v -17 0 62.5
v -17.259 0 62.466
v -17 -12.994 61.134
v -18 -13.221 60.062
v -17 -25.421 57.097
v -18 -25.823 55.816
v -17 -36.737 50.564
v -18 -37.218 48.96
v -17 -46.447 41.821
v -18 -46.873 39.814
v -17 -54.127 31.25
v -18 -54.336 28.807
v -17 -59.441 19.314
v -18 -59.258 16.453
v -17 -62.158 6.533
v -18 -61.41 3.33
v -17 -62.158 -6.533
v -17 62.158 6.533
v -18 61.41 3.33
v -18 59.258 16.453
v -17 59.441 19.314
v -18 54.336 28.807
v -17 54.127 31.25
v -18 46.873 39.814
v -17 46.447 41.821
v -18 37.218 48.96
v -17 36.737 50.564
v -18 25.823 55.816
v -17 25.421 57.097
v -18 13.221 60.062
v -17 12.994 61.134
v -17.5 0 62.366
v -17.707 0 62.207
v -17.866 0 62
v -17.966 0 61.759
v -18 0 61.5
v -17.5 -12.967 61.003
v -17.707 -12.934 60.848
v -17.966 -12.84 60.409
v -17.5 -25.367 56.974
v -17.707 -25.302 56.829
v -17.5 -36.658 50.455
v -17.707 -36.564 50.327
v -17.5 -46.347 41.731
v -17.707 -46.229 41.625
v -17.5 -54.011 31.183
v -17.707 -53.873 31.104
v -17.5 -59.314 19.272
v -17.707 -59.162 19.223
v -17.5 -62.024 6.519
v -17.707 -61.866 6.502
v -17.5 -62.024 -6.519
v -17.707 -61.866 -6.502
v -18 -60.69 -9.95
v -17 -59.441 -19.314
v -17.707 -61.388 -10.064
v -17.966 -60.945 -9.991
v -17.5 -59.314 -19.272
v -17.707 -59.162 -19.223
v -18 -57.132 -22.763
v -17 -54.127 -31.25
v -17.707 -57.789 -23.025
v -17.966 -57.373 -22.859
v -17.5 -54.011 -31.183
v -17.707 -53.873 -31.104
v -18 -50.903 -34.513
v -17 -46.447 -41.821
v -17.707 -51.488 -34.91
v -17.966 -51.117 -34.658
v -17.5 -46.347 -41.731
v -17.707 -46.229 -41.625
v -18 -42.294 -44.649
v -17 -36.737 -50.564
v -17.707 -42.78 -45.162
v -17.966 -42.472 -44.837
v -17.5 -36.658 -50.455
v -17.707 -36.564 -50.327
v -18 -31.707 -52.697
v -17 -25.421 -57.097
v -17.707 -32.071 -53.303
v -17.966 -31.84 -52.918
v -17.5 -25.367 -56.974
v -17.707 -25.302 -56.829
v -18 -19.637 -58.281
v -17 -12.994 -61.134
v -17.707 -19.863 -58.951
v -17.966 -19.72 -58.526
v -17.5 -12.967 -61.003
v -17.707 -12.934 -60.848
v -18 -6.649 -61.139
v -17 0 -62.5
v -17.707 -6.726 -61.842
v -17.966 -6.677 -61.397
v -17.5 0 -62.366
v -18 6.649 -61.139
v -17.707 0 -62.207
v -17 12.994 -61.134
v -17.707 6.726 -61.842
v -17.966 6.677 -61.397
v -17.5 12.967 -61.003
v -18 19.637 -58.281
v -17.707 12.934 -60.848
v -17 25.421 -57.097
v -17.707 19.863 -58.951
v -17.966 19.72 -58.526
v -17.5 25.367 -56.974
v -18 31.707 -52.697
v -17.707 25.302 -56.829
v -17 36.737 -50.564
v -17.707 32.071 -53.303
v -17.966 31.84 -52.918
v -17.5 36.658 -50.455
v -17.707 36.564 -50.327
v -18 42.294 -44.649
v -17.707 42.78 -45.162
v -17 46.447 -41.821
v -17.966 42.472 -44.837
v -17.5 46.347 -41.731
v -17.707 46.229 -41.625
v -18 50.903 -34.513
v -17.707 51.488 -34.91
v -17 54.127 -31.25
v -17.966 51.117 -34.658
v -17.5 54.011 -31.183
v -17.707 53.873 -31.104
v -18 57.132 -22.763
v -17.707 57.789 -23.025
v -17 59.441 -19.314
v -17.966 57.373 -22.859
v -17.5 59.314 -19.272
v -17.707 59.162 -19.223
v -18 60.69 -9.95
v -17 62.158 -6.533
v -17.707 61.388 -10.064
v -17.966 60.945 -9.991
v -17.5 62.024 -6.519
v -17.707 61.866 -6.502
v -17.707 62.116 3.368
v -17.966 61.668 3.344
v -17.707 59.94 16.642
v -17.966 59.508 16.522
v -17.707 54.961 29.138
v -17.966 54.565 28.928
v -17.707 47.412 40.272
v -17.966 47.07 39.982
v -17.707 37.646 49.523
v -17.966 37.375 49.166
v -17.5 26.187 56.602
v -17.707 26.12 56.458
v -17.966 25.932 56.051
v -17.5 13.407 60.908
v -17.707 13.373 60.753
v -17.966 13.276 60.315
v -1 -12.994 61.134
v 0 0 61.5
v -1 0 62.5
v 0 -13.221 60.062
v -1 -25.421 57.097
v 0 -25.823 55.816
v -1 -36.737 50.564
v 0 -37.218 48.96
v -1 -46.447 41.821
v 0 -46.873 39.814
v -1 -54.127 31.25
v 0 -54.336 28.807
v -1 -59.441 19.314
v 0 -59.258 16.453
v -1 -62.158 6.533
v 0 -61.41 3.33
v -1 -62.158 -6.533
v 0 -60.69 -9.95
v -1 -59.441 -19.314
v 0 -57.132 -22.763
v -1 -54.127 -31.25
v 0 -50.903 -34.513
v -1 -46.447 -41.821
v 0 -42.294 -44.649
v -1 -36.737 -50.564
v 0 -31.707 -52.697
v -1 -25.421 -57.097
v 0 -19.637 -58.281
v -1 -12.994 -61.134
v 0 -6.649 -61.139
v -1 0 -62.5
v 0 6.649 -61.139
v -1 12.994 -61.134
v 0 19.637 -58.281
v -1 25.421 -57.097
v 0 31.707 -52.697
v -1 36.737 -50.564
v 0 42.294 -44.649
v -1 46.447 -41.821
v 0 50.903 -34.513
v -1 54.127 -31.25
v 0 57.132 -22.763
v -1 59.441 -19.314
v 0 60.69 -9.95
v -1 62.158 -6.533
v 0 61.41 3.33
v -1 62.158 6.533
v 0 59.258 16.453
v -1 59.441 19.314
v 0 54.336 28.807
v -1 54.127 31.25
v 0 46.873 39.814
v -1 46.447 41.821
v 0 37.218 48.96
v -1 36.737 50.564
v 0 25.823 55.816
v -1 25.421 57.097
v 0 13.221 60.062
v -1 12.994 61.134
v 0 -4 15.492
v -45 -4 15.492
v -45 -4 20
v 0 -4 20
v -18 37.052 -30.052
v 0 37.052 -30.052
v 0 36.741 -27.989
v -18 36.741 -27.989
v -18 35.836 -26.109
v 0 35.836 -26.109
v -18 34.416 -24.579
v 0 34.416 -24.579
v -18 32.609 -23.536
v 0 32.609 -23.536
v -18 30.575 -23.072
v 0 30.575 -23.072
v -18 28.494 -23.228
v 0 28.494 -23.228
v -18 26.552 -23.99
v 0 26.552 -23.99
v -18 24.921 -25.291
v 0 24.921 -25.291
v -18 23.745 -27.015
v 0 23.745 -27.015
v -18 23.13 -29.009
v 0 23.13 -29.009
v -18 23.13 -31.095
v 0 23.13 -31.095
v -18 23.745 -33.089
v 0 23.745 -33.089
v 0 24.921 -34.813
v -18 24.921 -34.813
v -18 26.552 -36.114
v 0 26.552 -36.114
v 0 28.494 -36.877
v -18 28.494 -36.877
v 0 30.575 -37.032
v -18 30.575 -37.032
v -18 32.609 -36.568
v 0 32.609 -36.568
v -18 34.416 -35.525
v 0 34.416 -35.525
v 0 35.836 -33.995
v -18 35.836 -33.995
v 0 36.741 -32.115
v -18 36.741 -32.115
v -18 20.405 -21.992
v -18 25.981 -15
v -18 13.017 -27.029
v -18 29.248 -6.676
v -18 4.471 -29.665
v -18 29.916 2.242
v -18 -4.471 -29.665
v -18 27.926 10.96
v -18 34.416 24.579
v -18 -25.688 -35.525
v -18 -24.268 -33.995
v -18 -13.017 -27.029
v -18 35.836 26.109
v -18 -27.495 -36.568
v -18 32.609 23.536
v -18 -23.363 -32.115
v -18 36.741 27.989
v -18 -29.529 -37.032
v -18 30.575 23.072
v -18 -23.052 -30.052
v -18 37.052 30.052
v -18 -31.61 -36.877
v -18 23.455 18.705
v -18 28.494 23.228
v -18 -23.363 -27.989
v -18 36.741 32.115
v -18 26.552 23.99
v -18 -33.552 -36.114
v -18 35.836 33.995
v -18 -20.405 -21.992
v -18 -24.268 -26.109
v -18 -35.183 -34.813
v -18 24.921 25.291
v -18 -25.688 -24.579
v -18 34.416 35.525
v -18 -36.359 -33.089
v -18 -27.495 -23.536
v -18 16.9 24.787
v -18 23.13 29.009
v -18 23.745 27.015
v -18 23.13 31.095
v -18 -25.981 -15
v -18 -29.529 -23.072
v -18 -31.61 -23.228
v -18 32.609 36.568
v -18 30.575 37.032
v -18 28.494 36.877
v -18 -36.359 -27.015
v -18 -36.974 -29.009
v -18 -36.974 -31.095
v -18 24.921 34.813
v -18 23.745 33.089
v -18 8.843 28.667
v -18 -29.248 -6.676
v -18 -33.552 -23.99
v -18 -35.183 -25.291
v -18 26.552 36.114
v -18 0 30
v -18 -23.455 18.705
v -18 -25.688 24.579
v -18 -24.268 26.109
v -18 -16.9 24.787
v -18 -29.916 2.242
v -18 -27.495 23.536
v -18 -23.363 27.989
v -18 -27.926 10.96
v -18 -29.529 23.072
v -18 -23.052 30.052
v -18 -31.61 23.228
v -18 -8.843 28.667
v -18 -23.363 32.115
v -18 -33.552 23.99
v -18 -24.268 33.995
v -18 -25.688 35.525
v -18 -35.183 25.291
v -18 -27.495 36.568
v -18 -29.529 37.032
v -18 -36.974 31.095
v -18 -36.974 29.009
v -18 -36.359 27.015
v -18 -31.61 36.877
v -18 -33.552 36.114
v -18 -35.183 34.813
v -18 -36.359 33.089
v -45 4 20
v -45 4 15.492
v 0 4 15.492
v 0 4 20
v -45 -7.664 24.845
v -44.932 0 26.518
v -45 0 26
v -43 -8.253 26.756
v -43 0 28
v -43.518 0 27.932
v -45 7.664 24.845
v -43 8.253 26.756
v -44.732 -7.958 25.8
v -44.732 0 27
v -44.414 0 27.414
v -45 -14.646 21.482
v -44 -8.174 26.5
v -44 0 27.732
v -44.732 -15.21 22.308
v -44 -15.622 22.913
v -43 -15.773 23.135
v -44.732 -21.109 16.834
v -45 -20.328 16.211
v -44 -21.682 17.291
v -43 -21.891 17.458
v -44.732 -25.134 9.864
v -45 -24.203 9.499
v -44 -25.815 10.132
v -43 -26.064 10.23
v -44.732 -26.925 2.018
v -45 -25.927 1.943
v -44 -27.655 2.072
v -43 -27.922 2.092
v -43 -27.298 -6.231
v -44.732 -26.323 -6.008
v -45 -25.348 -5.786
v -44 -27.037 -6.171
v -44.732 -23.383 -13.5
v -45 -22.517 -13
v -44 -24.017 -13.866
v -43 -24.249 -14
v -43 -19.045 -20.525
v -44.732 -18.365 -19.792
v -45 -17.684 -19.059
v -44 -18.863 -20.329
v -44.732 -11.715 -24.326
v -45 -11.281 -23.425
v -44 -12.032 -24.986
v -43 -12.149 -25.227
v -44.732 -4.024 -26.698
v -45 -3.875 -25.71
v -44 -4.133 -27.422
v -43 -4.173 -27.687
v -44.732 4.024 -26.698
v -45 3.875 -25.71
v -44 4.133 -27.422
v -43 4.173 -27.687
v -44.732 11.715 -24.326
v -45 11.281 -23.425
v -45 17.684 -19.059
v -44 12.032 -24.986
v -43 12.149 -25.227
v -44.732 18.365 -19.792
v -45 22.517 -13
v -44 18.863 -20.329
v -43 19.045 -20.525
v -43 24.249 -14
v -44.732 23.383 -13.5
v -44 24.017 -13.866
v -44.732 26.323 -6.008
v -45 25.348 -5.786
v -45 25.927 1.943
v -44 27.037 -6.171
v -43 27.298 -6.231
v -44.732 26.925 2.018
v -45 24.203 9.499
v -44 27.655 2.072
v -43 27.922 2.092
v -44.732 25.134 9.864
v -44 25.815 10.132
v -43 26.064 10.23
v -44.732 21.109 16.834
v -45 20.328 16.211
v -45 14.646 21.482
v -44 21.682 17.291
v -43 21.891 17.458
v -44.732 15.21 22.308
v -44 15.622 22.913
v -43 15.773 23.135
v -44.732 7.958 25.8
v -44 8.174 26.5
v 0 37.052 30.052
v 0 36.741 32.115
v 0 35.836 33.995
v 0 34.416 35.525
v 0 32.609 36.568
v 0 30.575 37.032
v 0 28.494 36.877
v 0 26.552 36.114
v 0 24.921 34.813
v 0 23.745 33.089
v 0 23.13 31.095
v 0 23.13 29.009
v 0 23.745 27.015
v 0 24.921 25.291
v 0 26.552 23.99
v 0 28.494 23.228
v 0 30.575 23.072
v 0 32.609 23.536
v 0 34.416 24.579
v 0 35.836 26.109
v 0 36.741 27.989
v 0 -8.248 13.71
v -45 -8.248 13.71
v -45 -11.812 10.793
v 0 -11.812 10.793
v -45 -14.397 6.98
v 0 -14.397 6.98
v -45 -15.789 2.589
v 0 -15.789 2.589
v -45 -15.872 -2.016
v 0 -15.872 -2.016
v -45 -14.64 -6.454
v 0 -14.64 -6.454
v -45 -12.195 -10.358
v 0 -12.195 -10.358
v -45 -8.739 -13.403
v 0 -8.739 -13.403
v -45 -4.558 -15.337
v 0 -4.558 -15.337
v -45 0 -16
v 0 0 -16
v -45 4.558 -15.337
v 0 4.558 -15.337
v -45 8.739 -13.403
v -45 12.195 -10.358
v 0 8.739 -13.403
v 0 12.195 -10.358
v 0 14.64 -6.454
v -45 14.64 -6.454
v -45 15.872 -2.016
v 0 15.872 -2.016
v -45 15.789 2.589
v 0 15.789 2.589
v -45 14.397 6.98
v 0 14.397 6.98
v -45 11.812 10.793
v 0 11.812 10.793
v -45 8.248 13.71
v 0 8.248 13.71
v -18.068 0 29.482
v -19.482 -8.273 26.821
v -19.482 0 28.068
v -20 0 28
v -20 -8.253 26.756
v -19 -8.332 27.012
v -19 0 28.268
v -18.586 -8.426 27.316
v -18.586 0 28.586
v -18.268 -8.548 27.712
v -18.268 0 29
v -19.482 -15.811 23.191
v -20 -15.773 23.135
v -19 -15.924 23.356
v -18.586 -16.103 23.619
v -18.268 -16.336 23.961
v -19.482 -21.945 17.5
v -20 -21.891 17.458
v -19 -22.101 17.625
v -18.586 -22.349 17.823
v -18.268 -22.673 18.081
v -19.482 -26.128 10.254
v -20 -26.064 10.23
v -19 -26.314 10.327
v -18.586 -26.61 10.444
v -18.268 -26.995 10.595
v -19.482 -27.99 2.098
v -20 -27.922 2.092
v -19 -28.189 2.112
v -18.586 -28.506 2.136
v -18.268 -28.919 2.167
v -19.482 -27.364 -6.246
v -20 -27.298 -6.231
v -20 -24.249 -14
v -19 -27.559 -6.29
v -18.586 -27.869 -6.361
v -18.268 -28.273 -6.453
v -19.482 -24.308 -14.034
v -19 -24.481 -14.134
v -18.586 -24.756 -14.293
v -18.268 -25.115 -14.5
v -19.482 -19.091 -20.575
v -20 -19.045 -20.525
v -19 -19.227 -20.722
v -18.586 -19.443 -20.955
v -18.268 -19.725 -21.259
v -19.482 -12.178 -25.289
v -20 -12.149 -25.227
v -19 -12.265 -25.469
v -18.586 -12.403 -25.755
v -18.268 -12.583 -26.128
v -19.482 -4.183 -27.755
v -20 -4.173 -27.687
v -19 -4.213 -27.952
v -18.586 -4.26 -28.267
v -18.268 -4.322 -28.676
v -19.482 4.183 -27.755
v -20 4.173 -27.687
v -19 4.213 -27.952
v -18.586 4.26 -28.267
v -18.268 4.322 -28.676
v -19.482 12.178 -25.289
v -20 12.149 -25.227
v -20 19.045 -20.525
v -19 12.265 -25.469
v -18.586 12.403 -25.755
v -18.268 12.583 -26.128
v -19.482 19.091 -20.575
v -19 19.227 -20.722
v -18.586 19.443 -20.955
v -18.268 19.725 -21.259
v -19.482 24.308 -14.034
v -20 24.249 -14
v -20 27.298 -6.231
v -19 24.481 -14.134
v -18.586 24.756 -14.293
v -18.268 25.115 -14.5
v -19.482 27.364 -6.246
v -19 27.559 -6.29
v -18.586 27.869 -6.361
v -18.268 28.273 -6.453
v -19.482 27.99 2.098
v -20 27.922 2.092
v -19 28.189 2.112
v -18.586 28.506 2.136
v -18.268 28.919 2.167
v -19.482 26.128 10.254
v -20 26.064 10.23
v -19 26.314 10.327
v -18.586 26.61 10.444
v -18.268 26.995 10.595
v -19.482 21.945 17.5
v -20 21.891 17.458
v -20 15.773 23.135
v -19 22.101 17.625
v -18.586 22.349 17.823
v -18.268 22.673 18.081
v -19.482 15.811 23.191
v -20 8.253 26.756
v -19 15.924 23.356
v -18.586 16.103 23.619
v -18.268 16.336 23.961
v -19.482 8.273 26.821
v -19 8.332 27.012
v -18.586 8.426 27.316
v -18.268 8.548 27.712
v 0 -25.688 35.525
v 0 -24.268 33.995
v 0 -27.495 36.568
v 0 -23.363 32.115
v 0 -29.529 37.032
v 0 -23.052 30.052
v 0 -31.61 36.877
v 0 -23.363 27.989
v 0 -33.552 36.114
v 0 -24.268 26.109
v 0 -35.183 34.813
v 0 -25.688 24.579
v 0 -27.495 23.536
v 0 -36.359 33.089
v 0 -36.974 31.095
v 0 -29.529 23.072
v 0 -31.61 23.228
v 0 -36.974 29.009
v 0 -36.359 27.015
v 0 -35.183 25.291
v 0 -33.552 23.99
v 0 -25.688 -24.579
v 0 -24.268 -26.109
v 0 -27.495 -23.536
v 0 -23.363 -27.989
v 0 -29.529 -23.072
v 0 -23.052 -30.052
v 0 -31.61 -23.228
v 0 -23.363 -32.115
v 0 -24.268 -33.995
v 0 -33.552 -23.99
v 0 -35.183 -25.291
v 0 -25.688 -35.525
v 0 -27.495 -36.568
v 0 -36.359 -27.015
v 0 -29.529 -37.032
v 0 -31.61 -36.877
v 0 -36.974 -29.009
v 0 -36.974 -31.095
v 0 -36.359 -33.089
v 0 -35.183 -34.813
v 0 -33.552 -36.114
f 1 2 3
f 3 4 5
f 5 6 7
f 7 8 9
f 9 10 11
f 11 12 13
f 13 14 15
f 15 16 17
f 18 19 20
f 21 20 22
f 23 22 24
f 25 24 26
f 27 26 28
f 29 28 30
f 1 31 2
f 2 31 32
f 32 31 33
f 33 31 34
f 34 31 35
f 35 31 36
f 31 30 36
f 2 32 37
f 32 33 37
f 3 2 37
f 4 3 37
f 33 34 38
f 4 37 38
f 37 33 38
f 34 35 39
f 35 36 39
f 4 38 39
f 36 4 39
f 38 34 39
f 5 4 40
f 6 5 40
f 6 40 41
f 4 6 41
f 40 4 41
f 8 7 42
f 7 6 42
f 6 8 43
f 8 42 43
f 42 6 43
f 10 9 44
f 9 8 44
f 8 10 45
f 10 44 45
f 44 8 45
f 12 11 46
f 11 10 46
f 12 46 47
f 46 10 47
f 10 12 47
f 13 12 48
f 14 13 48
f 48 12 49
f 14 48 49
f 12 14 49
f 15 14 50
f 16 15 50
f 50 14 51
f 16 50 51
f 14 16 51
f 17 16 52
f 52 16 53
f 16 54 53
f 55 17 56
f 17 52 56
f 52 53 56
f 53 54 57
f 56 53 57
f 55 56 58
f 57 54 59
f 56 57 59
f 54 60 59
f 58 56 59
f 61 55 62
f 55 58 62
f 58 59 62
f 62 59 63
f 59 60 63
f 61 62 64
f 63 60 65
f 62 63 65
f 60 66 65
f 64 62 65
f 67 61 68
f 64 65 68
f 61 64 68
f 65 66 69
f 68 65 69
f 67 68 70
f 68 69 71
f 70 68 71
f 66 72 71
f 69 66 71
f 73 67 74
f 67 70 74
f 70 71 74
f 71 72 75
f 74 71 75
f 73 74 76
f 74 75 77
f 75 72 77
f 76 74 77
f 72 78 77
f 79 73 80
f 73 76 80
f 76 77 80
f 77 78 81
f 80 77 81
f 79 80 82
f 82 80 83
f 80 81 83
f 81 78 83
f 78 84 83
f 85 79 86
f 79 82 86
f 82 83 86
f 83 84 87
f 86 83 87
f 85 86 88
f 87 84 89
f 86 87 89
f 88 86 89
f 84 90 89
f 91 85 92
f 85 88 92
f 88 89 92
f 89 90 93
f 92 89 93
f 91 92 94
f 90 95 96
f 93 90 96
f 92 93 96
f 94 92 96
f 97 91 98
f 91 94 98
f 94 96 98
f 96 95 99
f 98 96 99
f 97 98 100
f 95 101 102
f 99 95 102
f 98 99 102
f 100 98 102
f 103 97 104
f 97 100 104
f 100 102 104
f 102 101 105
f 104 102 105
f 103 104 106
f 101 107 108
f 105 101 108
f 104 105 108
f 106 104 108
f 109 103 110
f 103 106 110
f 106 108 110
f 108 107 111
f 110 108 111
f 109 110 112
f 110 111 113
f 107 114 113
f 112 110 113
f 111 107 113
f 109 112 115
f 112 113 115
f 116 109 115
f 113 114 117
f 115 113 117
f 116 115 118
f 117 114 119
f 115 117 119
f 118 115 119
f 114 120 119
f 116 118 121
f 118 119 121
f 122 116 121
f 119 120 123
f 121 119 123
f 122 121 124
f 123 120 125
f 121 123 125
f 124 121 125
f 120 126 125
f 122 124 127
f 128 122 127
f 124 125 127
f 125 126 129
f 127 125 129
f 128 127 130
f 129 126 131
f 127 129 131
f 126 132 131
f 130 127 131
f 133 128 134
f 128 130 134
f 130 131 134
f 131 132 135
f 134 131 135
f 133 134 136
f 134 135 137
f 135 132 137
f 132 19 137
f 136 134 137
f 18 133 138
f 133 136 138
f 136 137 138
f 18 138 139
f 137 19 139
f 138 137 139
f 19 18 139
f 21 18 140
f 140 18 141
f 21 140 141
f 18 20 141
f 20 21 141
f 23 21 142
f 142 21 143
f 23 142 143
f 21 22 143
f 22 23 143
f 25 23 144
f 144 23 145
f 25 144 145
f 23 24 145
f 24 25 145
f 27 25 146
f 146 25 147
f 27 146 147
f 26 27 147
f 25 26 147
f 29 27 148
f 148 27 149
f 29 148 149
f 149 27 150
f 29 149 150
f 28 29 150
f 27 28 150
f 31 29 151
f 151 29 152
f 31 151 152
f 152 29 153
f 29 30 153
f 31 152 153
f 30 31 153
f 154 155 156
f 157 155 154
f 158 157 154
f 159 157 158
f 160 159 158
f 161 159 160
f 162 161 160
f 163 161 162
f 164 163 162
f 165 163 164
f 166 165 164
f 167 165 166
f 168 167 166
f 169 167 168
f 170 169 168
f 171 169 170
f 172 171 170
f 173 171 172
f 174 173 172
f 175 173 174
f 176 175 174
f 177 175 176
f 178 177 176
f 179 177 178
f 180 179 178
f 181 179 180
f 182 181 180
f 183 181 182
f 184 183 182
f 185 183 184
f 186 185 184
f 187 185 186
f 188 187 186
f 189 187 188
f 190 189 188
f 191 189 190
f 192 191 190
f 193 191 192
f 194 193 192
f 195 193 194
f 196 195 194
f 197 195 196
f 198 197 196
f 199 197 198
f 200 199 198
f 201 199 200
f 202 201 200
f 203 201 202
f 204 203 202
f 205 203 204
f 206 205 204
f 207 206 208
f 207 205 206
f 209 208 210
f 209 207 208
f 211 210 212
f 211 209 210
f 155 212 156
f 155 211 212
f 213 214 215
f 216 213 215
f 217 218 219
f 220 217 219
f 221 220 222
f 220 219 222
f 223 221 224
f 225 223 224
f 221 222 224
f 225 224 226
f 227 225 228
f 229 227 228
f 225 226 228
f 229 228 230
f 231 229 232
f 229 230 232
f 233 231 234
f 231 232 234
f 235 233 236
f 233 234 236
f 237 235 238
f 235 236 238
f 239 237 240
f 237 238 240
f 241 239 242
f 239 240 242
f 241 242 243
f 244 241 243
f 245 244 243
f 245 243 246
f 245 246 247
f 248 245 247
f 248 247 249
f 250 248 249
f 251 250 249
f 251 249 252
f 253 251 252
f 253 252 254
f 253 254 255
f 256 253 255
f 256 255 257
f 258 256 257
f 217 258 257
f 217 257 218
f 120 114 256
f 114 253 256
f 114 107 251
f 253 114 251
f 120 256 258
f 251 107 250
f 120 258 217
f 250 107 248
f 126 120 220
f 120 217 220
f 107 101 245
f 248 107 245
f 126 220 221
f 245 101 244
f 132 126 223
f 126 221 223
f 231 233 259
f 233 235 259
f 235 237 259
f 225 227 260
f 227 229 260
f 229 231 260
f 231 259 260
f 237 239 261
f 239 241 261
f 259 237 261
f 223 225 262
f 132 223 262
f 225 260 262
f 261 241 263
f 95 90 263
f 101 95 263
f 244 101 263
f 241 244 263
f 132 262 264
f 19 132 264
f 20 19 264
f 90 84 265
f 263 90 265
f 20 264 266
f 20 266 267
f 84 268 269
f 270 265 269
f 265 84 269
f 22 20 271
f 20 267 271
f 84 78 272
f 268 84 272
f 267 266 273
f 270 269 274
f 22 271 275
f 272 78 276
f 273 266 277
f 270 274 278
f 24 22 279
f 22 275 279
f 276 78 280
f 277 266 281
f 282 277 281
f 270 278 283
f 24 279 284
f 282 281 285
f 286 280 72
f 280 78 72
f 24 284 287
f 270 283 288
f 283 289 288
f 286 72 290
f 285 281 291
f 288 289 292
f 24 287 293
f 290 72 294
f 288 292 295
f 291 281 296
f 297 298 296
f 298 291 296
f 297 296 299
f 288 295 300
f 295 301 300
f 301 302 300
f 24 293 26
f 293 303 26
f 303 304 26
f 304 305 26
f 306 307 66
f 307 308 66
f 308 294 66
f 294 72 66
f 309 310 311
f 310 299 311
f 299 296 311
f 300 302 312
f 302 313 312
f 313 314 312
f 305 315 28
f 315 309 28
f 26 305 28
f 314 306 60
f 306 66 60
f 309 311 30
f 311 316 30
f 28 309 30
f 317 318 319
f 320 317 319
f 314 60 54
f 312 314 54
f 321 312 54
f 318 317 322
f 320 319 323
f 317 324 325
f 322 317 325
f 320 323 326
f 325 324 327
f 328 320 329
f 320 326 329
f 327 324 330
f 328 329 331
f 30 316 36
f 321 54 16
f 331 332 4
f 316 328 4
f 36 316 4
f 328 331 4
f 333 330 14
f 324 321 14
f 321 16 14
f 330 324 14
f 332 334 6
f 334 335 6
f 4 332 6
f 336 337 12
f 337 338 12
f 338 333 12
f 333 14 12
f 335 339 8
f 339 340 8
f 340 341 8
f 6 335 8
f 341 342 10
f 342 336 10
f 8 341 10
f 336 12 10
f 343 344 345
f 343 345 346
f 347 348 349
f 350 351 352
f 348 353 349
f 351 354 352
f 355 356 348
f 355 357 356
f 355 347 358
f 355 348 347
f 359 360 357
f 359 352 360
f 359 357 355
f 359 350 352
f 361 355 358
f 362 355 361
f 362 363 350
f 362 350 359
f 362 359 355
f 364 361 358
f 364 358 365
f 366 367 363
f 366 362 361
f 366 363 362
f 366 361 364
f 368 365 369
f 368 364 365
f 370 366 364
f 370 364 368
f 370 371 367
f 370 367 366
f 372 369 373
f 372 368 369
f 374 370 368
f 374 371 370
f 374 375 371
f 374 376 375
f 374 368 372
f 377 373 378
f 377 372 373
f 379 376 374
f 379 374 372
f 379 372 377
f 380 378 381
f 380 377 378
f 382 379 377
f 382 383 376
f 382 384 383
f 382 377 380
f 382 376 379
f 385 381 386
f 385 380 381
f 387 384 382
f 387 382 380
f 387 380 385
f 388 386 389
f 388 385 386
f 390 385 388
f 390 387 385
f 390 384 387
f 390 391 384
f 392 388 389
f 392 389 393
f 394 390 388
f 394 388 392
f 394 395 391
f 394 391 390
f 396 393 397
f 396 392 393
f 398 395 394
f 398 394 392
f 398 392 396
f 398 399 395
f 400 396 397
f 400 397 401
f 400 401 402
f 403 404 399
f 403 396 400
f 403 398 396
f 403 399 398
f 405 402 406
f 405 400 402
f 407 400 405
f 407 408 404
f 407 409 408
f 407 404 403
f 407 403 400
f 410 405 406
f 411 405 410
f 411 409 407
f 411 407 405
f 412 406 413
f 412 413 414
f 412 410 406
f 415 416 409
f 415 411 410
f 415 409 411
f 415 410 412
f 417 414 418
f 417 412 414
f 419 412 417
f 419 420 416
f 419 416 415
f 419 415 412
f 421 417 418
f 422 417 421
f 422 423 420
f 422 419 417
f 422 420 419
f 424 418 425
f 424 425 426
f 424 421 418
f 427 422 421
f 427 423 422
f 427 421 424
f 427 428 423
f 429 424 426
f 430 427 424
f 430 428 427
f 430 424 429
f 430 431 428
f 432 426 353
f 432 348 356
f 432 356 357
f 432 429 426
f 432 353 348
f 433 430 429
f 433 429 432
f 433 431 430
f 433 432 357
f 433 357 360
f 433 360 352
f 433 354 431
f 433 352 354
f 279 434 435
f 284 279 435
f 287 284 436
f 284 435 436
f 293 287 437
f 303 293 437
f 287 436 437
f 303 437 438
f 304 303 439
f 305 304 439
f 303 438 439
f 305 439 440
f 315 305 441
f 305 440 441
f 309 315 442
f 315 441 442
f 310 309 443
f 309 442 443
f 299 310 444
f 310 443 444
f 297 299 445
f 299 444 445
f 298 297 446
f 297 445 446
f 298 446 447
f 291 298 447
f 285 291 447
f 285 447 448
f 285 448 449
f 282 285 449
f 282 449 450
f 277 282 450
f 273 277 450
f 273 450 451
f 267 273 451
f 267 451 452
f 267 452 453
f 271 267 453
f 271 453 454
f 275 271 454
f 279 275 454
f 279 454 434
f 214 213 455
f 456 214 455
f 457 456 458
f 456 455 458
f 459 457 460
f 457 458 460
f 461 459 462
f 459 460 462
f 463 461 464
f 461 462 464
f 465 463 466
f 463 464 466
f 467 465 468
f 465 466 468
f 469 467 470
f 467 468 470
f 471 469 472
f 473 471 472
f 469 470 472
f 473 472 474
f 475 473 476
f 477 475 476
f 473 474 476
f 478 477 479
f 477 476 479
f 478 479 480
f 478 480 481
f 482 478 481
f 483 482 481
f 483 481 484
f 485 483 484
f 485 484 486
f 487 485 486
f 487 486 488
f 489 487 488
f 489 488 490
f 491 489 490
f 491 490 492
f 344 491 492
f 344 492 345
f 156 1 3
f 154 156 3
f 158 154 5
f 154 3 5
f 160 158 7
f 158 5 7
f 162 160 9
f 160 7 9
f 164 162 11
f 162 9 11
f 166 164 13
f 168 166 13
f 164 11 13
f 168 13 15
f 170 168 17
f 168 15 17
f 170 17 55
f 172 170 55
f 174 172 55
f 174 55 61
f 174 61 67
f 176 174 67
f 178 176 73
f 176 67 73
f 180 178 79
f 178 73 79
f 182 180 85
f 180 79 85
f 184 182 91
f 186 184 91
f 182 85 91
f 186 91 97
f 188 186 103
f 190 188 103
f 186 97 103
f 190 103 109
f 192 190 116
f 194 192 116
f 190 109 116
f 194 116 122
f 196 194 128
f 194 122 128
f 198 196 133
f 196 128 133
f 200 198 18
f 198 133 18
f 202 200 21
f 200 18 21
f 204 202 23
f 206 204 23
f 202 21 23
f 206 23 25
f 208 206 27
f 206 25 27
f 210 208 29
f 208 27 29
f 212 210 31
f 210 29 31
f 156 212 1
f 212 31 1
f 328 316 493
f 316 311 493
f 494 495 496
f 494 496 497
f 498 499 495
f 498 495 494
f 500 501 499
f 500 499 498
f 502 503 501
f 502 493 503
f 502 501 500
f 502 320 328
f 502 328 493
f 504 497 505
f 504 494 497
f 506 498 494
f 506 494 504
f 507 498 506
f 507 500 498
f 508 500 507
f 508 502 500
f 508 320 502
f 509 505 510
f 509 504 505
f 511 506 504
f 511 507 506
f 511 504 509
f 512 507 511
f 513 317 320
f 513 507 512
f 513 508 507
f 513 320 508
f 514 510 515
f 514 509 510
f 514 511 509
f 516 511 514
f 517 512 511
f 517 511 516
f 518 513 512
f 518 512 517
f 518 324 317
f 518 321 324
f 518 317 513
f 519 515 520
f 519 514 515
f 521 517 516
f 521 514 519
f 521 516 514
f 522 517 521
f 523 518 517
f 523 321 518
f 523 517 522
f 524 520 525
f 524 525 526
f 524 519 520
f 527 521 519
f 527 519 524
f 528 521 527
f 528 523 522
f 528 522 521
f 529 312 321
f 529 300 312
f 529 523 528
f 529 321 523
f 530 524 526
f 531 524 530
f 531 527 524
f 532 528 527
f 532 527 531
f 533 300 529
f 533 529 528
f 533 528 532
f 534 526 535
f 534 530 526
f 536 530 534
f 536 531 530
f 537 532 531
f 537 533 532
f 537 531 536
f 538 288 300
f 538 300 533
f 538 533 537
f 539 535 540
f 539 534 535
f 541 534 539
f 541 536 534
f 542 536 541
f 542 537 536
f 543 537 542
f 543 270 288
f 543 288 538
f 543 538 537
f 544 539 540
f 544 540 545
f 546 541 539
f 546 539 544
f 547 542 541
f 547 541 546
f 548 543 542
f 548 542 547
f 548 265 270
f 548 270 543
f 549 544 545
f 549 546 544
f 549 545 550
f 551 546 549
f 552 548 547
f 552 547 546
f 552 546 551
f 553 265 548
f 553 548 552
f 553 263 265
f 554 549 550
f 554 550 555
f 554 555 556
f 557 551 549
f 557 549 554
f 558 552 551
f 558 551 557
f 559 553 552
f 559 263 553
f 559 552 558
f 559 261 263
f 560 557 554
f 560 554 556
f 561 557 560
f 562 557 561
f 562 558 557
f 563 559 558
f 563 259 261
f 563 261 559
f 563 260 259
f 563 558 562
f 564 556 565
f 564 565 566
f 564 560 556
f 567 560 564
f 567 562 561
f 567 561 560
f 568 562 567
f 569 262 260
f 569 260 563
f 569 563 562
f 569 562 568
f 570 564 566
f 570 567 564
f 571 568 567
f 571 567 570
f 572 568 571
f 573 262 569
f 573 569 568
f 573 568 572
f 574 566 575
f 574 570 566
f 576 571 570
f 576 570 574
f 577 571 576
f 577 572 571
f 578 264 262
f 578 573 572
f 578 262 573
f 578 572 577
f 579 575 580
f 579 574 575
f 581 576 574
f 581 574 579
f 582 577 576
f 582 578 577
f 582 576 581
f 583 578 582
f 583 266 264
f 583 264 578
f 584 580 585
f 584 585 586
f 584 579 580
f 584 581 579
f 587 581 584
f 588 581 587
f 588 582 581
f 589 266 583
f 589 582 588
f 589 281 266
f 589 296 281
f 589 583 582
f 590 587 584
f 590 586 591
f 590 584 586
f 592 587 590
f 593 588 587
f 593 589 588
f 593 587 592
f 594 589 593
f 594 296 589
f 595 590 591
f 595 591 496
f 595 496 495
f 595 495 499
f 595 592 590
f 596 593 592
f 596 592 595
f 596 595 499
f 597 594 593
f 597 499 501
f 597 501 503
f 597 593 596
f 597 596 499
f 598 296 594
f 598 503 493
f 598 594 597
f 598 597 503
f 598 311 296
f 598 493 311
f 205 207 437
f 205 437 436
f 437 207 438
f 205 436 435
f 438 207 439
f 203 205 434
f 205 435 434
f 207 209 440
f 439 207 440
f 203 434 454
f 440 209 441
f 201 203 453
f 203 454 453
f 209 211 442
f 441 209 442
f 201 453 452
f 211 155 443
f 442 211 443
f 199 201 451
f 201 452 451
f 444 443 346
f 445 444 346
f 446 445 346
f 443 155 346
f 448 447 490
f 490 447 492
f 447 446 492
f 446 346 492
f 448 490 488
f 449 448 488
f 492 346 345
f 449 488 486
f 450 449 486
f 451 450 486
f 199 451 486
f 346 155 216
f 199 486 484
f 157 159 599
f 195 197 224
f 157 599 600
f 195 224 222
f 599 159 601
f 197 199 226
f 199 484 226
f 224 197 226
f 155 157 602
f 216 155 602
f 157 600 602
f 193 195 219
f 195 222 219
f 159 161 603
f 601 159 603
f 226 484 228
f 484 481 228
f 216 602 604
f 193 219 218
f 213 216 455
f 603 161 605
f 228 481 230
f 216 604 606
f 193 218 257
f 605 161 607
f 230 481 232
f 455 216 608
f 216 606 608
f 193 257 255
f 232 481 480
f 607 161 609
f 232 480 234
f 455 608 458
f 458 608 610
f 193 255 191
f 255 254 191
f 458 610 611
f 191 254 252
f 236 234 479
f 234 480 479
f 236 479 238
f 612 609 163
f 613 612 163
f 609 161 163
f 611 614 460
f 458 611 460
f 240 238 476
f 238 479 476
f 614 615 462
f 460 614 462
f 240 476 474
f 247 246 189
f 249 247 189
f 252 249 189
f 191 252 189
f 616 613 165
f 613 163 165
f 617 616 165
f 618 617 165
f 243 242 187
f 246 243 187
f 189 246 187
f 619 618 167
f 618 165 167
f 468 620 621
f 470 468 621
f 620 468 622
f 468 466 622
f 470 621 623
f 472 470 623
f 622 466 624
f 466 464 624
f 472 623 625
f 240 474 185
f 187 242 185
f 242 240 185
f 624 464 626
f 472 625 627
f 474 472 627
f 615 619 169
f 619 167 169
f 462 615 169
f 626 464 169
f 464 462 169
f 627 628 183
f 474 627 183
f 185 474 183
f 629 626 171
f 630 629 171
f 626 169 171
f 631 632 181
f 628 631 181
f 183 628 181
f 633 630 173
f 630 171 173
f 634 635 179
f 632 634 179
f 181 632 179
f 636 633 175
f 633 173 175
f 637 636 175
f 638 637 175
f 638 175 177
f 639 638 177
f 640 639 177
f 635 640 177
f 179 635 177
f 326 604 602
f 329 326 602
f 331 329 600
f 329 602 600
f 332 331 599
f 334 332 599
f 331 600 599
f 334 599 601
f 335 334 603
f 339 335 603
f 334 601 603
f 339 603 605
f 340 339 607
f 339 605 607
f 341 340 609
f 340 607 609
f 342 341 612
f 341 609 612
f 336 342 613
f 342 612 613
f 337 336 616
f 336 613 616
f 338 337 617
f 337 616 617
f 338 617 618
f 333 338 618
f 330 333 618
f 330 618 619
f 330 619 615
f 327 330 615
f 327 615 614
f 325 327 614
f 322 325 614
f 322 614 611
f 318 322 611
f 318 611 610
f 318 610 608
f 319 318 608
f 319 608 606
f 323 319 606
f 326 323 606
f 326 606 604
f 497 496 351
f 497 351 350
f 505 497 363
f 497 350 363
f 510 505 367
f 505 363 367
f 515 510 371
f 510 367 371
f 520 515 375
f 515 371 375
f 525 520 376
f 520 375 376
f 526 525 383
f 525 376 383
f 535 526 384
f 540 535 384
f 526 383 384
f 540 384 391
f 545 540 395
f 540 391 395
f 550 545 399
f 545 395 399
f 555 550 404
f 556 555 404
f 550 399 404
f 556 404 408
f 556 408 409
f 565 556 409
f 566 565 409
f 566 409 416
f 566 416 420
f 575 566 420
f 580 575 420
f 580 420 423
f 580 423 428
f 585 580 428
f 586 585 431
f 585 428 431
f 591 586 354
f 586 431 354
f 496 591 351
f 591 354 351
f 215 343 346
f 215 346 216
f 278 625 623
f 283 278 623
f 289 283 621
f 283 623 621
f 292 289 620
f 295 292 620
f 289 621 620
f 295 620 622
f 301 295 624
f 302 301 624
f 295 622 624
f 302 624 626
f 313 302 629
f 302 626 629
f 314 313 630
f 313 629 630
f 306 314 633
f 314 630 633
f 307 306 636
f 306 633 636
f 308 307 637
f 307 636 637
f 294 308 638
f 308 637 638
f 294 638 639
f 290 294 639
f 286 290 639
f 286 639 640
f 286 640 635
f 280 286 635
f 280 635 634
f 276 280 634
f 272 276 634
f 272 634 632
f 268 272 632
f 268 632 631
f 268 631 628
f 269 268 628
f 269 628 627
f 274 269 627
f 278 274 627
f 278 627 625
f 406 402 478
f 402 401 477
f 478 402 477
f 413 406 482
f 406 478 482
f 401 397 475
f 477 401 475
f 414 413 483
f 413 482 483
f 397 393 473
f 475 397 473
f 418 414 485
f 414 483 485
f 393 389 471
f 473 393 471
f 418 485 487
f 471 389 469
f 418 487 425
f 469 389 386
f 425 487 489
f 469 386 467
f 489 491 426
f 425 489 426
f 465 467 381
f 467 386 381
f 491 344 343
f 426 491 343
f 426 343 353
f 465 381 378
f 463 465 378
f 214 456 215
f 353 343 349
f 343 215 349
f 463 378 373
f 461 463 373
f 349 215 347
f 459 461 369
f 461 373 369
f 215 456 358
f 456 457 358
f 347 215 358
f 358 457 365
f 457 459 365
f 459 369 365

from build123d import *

# Parameters (mm, degrees)
F2_W     = 8
F2_H     = 8
F3_DEPTH = 45.001
F5_D     = 14
F6_R     = 2
F7_R     = 1
F8_SIZE  = 1


with BuildPart() as f1:
    # F0 (on Front) → F1 (revolve)
    with BuildSketch(Plane.XZ):
        Polygon((-45, 16), (0, 16), (0, 62.5), (-18, 62.5), (-18, 28), (-45, 28), align=None)
    revolve(axis=Axis((-18.421089, 0, 0), (1, 0, 0)))

    # F2 (on face) → F3 (cut, through all)
    with BuildSketch(Plane(origin=(-45, 0, 0), x_dir=(0, -1, 0), z_dir=(-1, 0, 0))):
        with Locations((0, 16)):
            Rectangle(F2_W, F2_H)
    extrude(amount=-F3_DEPTH, mode=Mode.SUBTRACT)

    # F5 (through all)
    with Locations(Plane(origin=(-18, 0, 0), x_dir=(0, -1, 0), z_dir=(-1, 0, 0))):
        with Locations((-30.052038, 30.052038), (-30.052038, -30.052038), (30.052038, -30.052038), (30.052038, 30.052038)):
            Hole(F5_D / 2)

    # F6
    f6_edges = [f1.edges().sort_by_distance(p)[0] for p in [
        (-45, 0, -28),
        (-18, 0, -28),
    ]]
    fillet(f6_edges, radius=F6_R)

    # F7
    f7_edges = [f1.edges().sort_by_distance(p)[0] for p in [
        (-18, 0, -62.5),
    ]]
    fillet(f7_edges, radius=F7_R)

    # F8
    f8_edges = [f1.edges().sort_by_distance(p)[0] for p in [
        (0, 0, -62.5),
    ]]
    chamfer(f8_edges, length=F8_SIZE)


solid = f1.part
